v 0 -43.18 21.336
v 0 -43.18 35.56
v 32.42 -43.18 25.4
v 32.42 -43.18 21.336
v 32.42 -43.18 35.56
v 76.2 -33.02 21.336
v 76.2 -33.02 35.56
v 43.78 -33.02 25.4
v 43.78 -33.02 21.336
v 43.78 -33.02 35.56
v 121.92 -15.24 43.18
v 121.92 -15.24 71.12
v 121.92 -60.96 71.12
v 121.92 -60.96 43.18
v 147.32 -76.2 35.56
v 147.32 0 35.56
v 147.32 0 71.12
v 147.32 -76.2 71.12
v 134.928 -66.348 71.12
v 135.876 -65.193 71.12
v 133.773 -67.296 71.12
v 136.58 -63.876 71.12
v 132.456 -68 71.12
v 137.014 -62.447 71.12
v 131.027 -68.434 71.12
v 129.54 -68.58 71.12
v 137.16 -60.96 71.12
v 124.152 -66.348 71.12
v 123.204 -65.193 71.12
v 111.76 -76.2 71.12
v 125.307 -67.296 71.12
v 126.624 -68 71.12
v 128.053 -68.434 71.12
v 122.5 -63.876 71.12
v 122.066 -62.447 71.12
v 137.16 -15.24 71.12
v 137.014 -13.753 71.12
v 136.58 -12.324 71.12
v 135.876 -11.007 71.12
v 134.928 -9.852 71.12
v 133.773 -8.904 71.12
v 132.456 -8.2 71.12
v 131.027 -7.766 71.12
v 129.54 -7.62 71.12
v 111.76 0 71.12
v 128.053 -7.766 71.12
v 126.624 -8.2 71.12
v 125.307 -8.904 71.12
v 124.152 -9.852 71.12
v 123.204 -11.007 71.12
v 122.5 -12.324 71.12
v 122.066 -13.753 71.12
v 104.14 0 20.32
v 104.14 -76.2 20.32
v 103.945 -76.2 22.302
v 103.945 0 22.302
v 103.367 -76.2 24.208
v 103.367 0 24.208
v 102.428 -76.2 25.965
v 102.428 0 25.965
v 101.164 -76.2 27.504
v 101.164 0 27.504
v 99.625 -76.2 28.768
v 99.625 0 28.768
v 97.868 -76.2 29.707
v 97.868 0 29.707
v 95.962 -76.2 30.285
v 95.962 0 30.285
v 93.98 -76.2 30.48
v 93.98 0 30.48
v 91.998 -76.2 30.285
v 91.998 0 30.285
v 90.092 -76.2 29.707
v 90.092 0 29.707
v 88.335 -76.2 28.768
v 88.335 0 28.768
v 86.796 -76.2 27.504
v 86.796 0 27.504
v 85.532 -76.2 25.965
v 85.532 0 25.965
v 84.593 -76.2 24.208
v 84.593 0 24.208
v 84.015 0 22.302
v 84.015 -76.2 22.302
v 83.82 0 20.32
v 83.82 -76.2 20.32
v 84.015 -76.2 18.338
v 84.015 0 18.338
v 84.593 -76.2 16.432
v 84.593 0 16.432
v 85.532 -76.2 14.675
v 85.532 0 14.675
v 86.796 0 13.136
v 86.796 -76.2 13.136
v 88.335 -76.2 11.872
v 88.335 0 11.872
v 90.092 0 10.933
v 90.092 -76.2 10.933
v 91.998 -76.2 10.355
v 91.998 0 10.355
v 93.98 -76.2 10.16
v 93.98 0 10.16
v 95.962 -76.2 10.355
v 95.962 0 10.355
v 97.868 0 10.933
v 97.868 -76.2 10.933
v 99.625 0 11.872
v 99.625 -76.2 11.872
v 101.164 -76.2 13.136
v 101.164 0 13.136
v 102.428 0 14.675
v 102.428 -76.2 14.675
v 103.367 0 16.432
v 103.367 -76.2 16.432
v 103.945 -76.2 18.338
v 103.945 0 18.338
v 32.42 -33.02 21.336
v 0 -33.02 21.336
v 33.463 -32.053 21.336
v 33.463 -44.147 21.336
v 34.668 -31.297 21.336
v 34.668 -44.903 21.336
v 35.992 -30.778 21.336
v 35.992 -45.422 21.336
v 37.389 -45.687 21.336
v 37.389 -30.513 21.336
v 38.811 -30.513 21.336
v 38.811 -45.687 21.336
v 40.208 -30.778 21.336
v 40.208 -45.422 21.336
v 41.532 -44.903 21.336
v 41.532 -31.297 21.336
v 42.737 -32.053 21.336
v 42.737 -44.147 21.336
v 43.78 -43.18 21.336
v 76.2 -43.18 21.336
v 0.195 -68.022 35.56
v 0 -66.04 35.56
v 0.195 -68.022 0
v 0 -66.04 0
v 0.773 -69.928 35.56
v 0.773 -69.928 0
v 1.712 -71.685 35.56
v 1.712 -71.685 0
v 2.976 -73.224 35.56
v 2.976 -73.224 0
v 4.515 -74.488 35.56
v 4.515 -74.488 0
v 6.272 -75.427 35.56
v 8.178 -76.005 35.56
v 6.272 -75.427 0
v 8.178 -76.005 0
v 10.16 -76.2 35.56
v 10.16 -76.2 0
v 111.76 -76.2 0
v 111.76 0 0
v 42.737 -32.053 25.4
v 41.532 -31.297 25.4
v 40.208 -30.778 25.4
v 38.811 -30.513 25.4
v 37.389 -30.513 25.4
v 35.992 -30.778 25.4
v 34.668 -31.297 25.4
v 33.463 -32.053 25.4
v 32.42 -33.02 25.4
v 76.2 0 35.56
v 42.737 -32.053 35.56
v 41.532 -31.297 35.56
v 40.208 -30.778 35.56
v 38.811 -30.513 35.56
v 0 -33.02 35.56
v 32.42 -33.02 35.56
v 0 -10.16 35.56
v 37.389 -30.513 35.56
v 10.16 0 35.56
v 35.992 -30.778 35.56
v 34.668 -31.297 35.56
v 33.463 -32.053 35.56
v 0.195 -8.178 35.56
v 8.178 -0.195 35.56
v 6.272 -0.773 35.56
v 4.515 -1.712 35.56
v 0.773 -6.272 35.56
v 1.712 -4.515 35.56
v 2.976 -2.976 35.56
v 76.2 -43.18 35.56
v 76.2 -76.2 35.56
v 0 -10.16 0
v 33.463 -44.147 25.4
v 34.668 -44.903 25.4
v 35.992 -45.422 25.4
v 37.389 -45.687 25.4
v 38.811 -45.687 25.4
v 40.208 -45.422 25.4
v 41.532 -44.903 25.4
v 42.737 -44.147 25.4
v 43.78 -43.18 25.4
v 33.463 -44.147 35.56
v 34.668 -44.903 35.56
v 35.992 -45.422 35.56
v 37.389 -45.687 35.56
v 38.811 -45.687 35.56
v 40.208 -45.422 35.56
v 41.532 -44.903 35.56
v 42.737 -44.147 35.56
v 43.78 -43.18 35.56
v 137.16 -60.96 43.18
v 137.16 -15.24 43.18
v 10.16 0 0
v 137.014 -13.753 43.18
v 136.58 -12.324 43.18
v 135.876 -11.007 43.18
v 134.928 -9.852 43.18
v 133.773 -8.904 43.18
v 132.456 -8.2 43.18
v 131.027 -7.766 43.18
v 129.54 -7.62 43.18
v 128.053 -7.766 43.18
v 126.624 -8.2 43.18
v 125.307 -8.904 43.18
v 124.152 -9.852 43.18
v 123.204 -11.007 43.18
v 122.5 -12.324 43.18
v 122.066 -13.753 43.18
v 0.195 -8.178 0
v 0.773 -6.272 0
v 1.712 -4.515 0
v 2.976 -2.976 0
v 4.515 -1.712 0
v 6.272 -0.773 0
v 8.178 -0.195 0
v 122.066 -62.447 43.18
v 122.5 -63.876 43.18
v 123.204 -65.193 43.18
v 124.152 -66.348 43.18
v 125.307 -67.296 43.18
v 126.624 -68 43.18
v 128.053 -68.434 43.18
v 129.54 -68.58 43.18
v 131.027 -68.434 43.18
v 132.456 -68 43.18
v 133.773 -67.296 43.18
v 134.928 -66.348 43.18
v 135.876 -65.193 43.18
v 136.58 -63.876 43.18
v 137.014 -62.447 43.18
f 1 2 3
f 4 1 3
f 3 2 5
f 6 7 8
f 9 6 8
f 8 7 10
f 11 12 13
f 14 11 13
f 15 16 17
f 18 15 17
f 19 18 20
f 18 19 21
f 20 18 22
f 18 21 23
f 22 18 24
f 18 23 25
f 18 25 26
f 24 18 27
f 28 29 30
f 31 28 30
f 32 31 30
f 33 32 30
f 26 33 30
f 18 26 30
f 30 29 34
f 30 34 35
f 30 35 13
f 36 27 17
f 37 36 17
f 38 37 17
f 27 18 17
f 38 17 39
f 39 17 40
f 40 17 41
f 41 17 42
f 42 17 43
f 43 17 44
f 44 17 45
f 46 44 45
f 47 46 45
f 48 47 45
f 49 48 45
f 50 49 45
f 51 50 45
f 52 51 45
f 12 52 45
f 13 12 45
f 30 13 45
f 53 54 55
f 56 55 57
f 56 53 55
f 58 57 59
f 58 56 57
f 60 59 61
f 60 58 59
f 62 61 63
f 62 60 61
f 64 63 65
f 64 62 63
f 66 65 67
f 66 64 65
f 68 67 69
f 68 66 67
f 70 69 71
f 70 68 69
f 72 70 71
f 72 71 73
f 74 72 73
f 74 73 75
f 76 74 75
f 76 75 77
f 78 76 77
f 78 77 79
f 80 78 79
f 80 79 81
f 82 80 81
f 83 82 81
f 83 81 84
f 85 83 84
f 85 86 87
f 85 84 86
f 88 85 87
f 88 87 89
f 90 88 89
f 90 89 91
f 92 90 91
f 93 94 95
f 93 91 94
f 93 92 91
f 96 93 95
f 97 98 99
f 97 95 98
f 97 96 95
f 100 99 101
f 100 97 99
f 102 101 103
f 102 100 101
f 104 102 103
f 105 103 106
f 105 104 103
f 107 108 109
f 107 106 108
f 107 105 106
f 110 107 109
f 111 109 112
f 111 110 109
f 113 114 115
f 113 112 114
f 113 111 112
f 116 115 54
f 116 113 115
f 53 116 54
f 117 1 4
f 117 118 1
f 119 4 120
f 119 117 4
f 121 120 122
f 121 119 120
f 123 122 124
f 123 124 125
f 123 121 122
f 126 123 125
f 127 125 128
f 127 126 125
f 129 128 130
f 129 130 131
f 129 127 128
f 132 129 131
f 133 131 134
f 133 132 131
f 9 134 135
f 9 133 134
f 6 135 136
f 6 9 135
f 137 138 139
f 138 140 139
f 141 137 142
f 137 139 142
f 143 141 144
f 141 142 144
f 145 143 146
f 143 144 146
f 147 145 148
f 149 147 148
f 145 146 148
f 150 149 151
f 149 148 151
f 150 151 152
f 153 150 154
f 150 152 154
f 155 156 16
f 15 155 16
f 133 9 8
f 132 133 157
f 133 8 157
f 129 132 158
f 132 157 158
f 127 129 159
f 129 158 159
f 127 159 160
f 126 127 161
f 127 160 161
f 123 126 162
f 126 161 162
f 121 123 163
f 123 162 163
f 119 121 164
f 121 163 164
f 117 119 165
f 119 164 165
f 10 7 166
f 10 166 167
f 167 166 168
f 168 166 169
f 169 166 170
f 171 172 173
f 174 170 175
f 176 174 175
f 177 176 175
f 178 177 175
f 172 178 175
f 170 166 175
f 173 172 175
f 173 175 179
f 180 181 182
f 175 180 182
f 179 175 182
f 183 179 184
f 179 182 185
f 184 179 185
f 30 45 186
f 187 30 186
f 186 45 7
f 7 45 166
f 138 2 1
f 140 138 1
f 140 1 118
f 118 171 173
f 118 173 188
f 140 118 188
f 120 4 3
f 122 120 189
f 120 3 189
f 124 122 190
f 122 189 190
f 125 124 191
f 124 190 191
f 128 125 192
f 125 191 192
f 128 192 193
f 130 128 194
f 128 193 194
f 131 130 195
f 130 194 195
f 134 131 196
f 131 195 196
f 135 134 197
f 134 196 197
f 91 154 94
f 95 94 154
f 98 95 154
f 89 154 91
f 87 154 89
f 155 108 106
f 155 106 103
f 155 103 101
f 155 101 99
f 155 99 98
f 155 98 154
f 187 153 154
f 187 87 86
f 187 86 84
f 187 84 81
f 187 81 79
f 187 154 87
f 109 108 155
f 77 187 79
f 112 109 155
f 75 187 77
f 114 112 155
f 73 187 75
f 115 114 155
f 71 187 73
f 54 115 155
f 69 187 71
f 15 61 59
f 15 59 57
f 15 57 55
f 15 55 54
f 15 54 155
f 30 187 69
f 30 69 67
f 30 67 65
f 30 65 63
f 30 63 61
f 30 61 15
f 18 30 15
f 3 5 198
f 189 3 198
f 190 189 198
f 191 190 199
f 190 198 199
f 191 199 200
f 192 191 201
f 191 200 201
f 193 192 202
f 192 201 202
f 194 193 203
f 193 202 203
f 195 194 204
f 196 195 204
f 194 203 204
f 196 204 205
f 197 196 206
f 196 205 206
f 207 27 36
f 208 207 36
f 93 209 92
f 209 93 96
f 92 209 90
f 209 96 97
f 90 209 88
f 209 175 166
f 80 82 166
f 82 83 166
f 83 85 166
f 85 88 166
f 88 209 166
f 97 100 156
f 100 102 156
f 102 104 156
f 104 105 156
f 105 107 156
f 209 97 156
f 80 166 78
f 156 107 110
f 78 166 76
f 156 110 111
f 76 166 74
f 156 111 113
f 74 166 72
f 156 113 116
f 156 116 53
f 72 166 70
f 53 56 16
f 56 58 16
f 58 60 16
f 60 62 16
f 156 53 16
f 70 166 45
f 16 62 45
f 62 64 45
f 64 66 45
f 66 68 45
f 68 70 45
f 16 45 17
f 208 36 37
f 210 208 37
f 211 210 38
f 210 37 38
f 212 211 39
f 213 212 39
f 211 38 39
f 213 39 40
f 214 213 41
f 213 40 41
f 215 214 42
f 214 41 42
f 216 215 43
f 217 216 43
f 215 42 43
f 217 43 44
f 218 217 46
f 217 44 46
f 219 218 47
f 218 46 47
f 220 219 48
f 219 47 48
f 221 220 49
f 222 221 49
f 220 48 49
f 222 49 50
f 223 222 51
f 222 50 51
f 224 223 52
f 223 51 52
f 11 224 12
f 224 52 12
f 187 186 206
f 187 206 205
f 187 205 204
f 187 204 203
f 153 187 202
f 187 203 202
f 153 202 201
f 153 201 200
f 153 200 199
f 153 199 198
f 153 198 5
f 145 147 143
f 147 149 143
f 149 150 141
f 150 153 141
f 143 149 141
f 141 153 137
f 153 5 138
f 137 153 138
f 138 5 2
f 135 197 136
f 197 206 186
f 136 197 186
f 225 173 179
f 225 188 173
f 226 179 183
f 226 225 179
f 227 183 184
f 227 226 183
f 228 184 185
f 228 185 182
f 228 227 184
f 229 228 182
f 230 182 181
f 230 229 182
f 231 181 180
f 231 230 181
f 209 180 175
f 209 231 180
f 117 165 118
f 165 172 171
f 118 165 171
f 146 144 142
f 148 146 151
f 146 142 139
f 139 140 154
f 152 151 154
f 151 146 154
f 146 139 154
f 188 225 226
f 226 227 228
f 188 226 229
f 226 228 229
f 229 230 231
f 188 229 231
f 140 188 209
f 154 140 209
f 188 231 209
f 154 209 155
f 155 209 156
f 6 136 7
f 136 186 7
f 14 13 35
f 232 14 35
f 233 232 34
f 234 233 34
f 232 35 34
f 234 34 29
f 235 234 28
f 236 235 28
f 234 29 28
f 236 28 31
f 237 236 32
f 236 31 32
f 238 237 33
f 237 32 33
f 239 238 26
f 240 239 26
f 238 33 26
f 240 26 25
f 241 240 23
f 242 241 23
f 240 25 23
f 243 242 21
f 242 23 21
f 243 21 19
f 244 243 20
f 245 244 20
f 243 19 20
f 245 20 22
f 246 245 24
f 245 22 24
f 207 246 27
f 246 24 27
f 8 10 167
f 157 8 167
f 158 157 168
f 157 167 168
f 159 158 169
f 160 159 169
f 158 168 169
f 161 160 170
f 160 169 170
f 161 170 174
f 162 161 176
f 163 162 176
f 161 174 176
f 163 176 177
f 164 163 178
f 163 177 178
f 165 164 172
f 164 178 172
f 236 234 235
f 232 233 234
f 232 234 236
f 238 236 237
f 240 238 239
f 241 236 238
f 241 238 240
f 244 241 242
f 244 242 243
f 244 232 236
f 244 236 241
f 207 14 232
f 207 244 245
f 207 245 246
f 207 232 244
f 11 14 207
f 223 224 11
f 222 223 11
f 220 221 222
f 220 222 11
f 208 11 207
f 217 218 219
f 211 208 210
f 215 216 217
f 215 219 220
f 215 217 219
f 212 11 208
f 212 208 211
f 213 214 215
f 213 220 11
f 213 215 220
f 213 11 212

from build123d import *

# Parameters (mm, degrees)
F1_DEPTH  = 76.2
F2_R      = 10.16
F3_R      = 10.16
F4_DEPTH  = 76.201
F6_DEPTH  = 27.94
F7_W      = 76.2
F7_H      = 10.16
F8_DEPTH  = 10.16
F9_R      = 7.62
F9_R_2    = 3.175
F10_DEPTH = 10.16
F11_DEPTH = 4.064


with BuildPart() as f1:
    # F0 (on Front) → F1 (new body)
    with BuildSketch(Plane.XZ):
        Polygon((0, 35.56), (0, 0), (111.76, 0), (147.32, 35.56), (147.32, 71.12), (111.76, 71.12), (76.2, 35.56), align=None)
    extrude(amount=F1_DEPTH)

    # F2
    f2_edges = [f1.edges().sort_by_distance(p)[0] for p in [
        (0, -76.2, 17.78),
        (0, 0, 17.78),
    ]]
    fillet(f2_edges, radius=F2_R)

    # F3 (on face) → F4 (cut, through all)
    with BuildSketch(Plane.XZ):
        with Locations((93.98, 20.32)):
            Circle(F3_R)
    extrude(amount=F4_DEPTH, mode=Mode.SUBTRACT)

    # F5 (on face) → F6 (cut)
    with BuildSketch(Plane.XY.offset(71.12)):
        with BuildLine():
            ThreePointArc((137.16, -15.24), (129.54, -7.62), (121.92, -15.24))
            Line((121.92, -15.24), (121.92, -60.96))
            ThreePointArc((121.92, -60.96), (129.54, -68.58), (137.16, -60.96))
            Line((137.16, -60.96), (137.16, -15.24))
        make_face()
    extrude(amount=-F6_DEPTH, mode=Mode.SUBTRACT)

    # F7 (on face) → F8 (cut)
    with BuildSketch(Plane.XY.offset(35.56)):
        with Locations((38.1, -38.1)):
            Rectangle(F7_W, F7_H)
    extrude(amount=-F8_DEPTH, mode=Mode.SUBTRACT)

    # F9 (on face) → F10 (cut)
    with BuildSketch(Plane.XY.offset(35.56)):
        with Locations((38.1, -38.1)):
            Circle(F9_R)
        with Locations((38.1, -38.1)):
            Circle(F9_R_2, mode=Mode.SUBTRACT)
    extrude(amount=-F10_DEPTH, mode=Mode.SUBTRACT)

    # F9 (on face) + F10_face (on face) → F11 (cut)
    with BuildSketch(Plane.XY.offset(35.56)):
        with Locations((38.1, -38.1)):
            Circle(F9_R)
        with Locations((38.1, -38.1)):
            Circle(F9_R_2, mode=Mode.SUBTRACT)
    with BuildSketch(Plane(origin=(38.1, -38.1, 25.4), x_dir=(1, 0, 0), z_dir=(0, 0, 1))):
        with BuildLine():
            Line((-38.1, -5.08), (-5.679613, -5.08))
            ThreePointArc((-5.679613, -5.08), (0, -7.62), (5.679613, -5.08))
            Line((5.679613, -5.08), (38.1, -5.08))
            Line((38.1, -5.08), (38.1, 5.08))
            Line((38.1, 5.08), (5.679613, 5.08))
            ThreePointArc((5.679613, 5.08), (0, 7.62), (-5.679613, 5.08))
            Line((-5.679613, 5.08), (-38.1, 5.08))
            Line((-38.1, 5.08), (-38.1, -5.08))
        make_face()
    extrude(amount=-F11_DEPTH, mode=Mode.SUBTRACT)


solid = f1.part
